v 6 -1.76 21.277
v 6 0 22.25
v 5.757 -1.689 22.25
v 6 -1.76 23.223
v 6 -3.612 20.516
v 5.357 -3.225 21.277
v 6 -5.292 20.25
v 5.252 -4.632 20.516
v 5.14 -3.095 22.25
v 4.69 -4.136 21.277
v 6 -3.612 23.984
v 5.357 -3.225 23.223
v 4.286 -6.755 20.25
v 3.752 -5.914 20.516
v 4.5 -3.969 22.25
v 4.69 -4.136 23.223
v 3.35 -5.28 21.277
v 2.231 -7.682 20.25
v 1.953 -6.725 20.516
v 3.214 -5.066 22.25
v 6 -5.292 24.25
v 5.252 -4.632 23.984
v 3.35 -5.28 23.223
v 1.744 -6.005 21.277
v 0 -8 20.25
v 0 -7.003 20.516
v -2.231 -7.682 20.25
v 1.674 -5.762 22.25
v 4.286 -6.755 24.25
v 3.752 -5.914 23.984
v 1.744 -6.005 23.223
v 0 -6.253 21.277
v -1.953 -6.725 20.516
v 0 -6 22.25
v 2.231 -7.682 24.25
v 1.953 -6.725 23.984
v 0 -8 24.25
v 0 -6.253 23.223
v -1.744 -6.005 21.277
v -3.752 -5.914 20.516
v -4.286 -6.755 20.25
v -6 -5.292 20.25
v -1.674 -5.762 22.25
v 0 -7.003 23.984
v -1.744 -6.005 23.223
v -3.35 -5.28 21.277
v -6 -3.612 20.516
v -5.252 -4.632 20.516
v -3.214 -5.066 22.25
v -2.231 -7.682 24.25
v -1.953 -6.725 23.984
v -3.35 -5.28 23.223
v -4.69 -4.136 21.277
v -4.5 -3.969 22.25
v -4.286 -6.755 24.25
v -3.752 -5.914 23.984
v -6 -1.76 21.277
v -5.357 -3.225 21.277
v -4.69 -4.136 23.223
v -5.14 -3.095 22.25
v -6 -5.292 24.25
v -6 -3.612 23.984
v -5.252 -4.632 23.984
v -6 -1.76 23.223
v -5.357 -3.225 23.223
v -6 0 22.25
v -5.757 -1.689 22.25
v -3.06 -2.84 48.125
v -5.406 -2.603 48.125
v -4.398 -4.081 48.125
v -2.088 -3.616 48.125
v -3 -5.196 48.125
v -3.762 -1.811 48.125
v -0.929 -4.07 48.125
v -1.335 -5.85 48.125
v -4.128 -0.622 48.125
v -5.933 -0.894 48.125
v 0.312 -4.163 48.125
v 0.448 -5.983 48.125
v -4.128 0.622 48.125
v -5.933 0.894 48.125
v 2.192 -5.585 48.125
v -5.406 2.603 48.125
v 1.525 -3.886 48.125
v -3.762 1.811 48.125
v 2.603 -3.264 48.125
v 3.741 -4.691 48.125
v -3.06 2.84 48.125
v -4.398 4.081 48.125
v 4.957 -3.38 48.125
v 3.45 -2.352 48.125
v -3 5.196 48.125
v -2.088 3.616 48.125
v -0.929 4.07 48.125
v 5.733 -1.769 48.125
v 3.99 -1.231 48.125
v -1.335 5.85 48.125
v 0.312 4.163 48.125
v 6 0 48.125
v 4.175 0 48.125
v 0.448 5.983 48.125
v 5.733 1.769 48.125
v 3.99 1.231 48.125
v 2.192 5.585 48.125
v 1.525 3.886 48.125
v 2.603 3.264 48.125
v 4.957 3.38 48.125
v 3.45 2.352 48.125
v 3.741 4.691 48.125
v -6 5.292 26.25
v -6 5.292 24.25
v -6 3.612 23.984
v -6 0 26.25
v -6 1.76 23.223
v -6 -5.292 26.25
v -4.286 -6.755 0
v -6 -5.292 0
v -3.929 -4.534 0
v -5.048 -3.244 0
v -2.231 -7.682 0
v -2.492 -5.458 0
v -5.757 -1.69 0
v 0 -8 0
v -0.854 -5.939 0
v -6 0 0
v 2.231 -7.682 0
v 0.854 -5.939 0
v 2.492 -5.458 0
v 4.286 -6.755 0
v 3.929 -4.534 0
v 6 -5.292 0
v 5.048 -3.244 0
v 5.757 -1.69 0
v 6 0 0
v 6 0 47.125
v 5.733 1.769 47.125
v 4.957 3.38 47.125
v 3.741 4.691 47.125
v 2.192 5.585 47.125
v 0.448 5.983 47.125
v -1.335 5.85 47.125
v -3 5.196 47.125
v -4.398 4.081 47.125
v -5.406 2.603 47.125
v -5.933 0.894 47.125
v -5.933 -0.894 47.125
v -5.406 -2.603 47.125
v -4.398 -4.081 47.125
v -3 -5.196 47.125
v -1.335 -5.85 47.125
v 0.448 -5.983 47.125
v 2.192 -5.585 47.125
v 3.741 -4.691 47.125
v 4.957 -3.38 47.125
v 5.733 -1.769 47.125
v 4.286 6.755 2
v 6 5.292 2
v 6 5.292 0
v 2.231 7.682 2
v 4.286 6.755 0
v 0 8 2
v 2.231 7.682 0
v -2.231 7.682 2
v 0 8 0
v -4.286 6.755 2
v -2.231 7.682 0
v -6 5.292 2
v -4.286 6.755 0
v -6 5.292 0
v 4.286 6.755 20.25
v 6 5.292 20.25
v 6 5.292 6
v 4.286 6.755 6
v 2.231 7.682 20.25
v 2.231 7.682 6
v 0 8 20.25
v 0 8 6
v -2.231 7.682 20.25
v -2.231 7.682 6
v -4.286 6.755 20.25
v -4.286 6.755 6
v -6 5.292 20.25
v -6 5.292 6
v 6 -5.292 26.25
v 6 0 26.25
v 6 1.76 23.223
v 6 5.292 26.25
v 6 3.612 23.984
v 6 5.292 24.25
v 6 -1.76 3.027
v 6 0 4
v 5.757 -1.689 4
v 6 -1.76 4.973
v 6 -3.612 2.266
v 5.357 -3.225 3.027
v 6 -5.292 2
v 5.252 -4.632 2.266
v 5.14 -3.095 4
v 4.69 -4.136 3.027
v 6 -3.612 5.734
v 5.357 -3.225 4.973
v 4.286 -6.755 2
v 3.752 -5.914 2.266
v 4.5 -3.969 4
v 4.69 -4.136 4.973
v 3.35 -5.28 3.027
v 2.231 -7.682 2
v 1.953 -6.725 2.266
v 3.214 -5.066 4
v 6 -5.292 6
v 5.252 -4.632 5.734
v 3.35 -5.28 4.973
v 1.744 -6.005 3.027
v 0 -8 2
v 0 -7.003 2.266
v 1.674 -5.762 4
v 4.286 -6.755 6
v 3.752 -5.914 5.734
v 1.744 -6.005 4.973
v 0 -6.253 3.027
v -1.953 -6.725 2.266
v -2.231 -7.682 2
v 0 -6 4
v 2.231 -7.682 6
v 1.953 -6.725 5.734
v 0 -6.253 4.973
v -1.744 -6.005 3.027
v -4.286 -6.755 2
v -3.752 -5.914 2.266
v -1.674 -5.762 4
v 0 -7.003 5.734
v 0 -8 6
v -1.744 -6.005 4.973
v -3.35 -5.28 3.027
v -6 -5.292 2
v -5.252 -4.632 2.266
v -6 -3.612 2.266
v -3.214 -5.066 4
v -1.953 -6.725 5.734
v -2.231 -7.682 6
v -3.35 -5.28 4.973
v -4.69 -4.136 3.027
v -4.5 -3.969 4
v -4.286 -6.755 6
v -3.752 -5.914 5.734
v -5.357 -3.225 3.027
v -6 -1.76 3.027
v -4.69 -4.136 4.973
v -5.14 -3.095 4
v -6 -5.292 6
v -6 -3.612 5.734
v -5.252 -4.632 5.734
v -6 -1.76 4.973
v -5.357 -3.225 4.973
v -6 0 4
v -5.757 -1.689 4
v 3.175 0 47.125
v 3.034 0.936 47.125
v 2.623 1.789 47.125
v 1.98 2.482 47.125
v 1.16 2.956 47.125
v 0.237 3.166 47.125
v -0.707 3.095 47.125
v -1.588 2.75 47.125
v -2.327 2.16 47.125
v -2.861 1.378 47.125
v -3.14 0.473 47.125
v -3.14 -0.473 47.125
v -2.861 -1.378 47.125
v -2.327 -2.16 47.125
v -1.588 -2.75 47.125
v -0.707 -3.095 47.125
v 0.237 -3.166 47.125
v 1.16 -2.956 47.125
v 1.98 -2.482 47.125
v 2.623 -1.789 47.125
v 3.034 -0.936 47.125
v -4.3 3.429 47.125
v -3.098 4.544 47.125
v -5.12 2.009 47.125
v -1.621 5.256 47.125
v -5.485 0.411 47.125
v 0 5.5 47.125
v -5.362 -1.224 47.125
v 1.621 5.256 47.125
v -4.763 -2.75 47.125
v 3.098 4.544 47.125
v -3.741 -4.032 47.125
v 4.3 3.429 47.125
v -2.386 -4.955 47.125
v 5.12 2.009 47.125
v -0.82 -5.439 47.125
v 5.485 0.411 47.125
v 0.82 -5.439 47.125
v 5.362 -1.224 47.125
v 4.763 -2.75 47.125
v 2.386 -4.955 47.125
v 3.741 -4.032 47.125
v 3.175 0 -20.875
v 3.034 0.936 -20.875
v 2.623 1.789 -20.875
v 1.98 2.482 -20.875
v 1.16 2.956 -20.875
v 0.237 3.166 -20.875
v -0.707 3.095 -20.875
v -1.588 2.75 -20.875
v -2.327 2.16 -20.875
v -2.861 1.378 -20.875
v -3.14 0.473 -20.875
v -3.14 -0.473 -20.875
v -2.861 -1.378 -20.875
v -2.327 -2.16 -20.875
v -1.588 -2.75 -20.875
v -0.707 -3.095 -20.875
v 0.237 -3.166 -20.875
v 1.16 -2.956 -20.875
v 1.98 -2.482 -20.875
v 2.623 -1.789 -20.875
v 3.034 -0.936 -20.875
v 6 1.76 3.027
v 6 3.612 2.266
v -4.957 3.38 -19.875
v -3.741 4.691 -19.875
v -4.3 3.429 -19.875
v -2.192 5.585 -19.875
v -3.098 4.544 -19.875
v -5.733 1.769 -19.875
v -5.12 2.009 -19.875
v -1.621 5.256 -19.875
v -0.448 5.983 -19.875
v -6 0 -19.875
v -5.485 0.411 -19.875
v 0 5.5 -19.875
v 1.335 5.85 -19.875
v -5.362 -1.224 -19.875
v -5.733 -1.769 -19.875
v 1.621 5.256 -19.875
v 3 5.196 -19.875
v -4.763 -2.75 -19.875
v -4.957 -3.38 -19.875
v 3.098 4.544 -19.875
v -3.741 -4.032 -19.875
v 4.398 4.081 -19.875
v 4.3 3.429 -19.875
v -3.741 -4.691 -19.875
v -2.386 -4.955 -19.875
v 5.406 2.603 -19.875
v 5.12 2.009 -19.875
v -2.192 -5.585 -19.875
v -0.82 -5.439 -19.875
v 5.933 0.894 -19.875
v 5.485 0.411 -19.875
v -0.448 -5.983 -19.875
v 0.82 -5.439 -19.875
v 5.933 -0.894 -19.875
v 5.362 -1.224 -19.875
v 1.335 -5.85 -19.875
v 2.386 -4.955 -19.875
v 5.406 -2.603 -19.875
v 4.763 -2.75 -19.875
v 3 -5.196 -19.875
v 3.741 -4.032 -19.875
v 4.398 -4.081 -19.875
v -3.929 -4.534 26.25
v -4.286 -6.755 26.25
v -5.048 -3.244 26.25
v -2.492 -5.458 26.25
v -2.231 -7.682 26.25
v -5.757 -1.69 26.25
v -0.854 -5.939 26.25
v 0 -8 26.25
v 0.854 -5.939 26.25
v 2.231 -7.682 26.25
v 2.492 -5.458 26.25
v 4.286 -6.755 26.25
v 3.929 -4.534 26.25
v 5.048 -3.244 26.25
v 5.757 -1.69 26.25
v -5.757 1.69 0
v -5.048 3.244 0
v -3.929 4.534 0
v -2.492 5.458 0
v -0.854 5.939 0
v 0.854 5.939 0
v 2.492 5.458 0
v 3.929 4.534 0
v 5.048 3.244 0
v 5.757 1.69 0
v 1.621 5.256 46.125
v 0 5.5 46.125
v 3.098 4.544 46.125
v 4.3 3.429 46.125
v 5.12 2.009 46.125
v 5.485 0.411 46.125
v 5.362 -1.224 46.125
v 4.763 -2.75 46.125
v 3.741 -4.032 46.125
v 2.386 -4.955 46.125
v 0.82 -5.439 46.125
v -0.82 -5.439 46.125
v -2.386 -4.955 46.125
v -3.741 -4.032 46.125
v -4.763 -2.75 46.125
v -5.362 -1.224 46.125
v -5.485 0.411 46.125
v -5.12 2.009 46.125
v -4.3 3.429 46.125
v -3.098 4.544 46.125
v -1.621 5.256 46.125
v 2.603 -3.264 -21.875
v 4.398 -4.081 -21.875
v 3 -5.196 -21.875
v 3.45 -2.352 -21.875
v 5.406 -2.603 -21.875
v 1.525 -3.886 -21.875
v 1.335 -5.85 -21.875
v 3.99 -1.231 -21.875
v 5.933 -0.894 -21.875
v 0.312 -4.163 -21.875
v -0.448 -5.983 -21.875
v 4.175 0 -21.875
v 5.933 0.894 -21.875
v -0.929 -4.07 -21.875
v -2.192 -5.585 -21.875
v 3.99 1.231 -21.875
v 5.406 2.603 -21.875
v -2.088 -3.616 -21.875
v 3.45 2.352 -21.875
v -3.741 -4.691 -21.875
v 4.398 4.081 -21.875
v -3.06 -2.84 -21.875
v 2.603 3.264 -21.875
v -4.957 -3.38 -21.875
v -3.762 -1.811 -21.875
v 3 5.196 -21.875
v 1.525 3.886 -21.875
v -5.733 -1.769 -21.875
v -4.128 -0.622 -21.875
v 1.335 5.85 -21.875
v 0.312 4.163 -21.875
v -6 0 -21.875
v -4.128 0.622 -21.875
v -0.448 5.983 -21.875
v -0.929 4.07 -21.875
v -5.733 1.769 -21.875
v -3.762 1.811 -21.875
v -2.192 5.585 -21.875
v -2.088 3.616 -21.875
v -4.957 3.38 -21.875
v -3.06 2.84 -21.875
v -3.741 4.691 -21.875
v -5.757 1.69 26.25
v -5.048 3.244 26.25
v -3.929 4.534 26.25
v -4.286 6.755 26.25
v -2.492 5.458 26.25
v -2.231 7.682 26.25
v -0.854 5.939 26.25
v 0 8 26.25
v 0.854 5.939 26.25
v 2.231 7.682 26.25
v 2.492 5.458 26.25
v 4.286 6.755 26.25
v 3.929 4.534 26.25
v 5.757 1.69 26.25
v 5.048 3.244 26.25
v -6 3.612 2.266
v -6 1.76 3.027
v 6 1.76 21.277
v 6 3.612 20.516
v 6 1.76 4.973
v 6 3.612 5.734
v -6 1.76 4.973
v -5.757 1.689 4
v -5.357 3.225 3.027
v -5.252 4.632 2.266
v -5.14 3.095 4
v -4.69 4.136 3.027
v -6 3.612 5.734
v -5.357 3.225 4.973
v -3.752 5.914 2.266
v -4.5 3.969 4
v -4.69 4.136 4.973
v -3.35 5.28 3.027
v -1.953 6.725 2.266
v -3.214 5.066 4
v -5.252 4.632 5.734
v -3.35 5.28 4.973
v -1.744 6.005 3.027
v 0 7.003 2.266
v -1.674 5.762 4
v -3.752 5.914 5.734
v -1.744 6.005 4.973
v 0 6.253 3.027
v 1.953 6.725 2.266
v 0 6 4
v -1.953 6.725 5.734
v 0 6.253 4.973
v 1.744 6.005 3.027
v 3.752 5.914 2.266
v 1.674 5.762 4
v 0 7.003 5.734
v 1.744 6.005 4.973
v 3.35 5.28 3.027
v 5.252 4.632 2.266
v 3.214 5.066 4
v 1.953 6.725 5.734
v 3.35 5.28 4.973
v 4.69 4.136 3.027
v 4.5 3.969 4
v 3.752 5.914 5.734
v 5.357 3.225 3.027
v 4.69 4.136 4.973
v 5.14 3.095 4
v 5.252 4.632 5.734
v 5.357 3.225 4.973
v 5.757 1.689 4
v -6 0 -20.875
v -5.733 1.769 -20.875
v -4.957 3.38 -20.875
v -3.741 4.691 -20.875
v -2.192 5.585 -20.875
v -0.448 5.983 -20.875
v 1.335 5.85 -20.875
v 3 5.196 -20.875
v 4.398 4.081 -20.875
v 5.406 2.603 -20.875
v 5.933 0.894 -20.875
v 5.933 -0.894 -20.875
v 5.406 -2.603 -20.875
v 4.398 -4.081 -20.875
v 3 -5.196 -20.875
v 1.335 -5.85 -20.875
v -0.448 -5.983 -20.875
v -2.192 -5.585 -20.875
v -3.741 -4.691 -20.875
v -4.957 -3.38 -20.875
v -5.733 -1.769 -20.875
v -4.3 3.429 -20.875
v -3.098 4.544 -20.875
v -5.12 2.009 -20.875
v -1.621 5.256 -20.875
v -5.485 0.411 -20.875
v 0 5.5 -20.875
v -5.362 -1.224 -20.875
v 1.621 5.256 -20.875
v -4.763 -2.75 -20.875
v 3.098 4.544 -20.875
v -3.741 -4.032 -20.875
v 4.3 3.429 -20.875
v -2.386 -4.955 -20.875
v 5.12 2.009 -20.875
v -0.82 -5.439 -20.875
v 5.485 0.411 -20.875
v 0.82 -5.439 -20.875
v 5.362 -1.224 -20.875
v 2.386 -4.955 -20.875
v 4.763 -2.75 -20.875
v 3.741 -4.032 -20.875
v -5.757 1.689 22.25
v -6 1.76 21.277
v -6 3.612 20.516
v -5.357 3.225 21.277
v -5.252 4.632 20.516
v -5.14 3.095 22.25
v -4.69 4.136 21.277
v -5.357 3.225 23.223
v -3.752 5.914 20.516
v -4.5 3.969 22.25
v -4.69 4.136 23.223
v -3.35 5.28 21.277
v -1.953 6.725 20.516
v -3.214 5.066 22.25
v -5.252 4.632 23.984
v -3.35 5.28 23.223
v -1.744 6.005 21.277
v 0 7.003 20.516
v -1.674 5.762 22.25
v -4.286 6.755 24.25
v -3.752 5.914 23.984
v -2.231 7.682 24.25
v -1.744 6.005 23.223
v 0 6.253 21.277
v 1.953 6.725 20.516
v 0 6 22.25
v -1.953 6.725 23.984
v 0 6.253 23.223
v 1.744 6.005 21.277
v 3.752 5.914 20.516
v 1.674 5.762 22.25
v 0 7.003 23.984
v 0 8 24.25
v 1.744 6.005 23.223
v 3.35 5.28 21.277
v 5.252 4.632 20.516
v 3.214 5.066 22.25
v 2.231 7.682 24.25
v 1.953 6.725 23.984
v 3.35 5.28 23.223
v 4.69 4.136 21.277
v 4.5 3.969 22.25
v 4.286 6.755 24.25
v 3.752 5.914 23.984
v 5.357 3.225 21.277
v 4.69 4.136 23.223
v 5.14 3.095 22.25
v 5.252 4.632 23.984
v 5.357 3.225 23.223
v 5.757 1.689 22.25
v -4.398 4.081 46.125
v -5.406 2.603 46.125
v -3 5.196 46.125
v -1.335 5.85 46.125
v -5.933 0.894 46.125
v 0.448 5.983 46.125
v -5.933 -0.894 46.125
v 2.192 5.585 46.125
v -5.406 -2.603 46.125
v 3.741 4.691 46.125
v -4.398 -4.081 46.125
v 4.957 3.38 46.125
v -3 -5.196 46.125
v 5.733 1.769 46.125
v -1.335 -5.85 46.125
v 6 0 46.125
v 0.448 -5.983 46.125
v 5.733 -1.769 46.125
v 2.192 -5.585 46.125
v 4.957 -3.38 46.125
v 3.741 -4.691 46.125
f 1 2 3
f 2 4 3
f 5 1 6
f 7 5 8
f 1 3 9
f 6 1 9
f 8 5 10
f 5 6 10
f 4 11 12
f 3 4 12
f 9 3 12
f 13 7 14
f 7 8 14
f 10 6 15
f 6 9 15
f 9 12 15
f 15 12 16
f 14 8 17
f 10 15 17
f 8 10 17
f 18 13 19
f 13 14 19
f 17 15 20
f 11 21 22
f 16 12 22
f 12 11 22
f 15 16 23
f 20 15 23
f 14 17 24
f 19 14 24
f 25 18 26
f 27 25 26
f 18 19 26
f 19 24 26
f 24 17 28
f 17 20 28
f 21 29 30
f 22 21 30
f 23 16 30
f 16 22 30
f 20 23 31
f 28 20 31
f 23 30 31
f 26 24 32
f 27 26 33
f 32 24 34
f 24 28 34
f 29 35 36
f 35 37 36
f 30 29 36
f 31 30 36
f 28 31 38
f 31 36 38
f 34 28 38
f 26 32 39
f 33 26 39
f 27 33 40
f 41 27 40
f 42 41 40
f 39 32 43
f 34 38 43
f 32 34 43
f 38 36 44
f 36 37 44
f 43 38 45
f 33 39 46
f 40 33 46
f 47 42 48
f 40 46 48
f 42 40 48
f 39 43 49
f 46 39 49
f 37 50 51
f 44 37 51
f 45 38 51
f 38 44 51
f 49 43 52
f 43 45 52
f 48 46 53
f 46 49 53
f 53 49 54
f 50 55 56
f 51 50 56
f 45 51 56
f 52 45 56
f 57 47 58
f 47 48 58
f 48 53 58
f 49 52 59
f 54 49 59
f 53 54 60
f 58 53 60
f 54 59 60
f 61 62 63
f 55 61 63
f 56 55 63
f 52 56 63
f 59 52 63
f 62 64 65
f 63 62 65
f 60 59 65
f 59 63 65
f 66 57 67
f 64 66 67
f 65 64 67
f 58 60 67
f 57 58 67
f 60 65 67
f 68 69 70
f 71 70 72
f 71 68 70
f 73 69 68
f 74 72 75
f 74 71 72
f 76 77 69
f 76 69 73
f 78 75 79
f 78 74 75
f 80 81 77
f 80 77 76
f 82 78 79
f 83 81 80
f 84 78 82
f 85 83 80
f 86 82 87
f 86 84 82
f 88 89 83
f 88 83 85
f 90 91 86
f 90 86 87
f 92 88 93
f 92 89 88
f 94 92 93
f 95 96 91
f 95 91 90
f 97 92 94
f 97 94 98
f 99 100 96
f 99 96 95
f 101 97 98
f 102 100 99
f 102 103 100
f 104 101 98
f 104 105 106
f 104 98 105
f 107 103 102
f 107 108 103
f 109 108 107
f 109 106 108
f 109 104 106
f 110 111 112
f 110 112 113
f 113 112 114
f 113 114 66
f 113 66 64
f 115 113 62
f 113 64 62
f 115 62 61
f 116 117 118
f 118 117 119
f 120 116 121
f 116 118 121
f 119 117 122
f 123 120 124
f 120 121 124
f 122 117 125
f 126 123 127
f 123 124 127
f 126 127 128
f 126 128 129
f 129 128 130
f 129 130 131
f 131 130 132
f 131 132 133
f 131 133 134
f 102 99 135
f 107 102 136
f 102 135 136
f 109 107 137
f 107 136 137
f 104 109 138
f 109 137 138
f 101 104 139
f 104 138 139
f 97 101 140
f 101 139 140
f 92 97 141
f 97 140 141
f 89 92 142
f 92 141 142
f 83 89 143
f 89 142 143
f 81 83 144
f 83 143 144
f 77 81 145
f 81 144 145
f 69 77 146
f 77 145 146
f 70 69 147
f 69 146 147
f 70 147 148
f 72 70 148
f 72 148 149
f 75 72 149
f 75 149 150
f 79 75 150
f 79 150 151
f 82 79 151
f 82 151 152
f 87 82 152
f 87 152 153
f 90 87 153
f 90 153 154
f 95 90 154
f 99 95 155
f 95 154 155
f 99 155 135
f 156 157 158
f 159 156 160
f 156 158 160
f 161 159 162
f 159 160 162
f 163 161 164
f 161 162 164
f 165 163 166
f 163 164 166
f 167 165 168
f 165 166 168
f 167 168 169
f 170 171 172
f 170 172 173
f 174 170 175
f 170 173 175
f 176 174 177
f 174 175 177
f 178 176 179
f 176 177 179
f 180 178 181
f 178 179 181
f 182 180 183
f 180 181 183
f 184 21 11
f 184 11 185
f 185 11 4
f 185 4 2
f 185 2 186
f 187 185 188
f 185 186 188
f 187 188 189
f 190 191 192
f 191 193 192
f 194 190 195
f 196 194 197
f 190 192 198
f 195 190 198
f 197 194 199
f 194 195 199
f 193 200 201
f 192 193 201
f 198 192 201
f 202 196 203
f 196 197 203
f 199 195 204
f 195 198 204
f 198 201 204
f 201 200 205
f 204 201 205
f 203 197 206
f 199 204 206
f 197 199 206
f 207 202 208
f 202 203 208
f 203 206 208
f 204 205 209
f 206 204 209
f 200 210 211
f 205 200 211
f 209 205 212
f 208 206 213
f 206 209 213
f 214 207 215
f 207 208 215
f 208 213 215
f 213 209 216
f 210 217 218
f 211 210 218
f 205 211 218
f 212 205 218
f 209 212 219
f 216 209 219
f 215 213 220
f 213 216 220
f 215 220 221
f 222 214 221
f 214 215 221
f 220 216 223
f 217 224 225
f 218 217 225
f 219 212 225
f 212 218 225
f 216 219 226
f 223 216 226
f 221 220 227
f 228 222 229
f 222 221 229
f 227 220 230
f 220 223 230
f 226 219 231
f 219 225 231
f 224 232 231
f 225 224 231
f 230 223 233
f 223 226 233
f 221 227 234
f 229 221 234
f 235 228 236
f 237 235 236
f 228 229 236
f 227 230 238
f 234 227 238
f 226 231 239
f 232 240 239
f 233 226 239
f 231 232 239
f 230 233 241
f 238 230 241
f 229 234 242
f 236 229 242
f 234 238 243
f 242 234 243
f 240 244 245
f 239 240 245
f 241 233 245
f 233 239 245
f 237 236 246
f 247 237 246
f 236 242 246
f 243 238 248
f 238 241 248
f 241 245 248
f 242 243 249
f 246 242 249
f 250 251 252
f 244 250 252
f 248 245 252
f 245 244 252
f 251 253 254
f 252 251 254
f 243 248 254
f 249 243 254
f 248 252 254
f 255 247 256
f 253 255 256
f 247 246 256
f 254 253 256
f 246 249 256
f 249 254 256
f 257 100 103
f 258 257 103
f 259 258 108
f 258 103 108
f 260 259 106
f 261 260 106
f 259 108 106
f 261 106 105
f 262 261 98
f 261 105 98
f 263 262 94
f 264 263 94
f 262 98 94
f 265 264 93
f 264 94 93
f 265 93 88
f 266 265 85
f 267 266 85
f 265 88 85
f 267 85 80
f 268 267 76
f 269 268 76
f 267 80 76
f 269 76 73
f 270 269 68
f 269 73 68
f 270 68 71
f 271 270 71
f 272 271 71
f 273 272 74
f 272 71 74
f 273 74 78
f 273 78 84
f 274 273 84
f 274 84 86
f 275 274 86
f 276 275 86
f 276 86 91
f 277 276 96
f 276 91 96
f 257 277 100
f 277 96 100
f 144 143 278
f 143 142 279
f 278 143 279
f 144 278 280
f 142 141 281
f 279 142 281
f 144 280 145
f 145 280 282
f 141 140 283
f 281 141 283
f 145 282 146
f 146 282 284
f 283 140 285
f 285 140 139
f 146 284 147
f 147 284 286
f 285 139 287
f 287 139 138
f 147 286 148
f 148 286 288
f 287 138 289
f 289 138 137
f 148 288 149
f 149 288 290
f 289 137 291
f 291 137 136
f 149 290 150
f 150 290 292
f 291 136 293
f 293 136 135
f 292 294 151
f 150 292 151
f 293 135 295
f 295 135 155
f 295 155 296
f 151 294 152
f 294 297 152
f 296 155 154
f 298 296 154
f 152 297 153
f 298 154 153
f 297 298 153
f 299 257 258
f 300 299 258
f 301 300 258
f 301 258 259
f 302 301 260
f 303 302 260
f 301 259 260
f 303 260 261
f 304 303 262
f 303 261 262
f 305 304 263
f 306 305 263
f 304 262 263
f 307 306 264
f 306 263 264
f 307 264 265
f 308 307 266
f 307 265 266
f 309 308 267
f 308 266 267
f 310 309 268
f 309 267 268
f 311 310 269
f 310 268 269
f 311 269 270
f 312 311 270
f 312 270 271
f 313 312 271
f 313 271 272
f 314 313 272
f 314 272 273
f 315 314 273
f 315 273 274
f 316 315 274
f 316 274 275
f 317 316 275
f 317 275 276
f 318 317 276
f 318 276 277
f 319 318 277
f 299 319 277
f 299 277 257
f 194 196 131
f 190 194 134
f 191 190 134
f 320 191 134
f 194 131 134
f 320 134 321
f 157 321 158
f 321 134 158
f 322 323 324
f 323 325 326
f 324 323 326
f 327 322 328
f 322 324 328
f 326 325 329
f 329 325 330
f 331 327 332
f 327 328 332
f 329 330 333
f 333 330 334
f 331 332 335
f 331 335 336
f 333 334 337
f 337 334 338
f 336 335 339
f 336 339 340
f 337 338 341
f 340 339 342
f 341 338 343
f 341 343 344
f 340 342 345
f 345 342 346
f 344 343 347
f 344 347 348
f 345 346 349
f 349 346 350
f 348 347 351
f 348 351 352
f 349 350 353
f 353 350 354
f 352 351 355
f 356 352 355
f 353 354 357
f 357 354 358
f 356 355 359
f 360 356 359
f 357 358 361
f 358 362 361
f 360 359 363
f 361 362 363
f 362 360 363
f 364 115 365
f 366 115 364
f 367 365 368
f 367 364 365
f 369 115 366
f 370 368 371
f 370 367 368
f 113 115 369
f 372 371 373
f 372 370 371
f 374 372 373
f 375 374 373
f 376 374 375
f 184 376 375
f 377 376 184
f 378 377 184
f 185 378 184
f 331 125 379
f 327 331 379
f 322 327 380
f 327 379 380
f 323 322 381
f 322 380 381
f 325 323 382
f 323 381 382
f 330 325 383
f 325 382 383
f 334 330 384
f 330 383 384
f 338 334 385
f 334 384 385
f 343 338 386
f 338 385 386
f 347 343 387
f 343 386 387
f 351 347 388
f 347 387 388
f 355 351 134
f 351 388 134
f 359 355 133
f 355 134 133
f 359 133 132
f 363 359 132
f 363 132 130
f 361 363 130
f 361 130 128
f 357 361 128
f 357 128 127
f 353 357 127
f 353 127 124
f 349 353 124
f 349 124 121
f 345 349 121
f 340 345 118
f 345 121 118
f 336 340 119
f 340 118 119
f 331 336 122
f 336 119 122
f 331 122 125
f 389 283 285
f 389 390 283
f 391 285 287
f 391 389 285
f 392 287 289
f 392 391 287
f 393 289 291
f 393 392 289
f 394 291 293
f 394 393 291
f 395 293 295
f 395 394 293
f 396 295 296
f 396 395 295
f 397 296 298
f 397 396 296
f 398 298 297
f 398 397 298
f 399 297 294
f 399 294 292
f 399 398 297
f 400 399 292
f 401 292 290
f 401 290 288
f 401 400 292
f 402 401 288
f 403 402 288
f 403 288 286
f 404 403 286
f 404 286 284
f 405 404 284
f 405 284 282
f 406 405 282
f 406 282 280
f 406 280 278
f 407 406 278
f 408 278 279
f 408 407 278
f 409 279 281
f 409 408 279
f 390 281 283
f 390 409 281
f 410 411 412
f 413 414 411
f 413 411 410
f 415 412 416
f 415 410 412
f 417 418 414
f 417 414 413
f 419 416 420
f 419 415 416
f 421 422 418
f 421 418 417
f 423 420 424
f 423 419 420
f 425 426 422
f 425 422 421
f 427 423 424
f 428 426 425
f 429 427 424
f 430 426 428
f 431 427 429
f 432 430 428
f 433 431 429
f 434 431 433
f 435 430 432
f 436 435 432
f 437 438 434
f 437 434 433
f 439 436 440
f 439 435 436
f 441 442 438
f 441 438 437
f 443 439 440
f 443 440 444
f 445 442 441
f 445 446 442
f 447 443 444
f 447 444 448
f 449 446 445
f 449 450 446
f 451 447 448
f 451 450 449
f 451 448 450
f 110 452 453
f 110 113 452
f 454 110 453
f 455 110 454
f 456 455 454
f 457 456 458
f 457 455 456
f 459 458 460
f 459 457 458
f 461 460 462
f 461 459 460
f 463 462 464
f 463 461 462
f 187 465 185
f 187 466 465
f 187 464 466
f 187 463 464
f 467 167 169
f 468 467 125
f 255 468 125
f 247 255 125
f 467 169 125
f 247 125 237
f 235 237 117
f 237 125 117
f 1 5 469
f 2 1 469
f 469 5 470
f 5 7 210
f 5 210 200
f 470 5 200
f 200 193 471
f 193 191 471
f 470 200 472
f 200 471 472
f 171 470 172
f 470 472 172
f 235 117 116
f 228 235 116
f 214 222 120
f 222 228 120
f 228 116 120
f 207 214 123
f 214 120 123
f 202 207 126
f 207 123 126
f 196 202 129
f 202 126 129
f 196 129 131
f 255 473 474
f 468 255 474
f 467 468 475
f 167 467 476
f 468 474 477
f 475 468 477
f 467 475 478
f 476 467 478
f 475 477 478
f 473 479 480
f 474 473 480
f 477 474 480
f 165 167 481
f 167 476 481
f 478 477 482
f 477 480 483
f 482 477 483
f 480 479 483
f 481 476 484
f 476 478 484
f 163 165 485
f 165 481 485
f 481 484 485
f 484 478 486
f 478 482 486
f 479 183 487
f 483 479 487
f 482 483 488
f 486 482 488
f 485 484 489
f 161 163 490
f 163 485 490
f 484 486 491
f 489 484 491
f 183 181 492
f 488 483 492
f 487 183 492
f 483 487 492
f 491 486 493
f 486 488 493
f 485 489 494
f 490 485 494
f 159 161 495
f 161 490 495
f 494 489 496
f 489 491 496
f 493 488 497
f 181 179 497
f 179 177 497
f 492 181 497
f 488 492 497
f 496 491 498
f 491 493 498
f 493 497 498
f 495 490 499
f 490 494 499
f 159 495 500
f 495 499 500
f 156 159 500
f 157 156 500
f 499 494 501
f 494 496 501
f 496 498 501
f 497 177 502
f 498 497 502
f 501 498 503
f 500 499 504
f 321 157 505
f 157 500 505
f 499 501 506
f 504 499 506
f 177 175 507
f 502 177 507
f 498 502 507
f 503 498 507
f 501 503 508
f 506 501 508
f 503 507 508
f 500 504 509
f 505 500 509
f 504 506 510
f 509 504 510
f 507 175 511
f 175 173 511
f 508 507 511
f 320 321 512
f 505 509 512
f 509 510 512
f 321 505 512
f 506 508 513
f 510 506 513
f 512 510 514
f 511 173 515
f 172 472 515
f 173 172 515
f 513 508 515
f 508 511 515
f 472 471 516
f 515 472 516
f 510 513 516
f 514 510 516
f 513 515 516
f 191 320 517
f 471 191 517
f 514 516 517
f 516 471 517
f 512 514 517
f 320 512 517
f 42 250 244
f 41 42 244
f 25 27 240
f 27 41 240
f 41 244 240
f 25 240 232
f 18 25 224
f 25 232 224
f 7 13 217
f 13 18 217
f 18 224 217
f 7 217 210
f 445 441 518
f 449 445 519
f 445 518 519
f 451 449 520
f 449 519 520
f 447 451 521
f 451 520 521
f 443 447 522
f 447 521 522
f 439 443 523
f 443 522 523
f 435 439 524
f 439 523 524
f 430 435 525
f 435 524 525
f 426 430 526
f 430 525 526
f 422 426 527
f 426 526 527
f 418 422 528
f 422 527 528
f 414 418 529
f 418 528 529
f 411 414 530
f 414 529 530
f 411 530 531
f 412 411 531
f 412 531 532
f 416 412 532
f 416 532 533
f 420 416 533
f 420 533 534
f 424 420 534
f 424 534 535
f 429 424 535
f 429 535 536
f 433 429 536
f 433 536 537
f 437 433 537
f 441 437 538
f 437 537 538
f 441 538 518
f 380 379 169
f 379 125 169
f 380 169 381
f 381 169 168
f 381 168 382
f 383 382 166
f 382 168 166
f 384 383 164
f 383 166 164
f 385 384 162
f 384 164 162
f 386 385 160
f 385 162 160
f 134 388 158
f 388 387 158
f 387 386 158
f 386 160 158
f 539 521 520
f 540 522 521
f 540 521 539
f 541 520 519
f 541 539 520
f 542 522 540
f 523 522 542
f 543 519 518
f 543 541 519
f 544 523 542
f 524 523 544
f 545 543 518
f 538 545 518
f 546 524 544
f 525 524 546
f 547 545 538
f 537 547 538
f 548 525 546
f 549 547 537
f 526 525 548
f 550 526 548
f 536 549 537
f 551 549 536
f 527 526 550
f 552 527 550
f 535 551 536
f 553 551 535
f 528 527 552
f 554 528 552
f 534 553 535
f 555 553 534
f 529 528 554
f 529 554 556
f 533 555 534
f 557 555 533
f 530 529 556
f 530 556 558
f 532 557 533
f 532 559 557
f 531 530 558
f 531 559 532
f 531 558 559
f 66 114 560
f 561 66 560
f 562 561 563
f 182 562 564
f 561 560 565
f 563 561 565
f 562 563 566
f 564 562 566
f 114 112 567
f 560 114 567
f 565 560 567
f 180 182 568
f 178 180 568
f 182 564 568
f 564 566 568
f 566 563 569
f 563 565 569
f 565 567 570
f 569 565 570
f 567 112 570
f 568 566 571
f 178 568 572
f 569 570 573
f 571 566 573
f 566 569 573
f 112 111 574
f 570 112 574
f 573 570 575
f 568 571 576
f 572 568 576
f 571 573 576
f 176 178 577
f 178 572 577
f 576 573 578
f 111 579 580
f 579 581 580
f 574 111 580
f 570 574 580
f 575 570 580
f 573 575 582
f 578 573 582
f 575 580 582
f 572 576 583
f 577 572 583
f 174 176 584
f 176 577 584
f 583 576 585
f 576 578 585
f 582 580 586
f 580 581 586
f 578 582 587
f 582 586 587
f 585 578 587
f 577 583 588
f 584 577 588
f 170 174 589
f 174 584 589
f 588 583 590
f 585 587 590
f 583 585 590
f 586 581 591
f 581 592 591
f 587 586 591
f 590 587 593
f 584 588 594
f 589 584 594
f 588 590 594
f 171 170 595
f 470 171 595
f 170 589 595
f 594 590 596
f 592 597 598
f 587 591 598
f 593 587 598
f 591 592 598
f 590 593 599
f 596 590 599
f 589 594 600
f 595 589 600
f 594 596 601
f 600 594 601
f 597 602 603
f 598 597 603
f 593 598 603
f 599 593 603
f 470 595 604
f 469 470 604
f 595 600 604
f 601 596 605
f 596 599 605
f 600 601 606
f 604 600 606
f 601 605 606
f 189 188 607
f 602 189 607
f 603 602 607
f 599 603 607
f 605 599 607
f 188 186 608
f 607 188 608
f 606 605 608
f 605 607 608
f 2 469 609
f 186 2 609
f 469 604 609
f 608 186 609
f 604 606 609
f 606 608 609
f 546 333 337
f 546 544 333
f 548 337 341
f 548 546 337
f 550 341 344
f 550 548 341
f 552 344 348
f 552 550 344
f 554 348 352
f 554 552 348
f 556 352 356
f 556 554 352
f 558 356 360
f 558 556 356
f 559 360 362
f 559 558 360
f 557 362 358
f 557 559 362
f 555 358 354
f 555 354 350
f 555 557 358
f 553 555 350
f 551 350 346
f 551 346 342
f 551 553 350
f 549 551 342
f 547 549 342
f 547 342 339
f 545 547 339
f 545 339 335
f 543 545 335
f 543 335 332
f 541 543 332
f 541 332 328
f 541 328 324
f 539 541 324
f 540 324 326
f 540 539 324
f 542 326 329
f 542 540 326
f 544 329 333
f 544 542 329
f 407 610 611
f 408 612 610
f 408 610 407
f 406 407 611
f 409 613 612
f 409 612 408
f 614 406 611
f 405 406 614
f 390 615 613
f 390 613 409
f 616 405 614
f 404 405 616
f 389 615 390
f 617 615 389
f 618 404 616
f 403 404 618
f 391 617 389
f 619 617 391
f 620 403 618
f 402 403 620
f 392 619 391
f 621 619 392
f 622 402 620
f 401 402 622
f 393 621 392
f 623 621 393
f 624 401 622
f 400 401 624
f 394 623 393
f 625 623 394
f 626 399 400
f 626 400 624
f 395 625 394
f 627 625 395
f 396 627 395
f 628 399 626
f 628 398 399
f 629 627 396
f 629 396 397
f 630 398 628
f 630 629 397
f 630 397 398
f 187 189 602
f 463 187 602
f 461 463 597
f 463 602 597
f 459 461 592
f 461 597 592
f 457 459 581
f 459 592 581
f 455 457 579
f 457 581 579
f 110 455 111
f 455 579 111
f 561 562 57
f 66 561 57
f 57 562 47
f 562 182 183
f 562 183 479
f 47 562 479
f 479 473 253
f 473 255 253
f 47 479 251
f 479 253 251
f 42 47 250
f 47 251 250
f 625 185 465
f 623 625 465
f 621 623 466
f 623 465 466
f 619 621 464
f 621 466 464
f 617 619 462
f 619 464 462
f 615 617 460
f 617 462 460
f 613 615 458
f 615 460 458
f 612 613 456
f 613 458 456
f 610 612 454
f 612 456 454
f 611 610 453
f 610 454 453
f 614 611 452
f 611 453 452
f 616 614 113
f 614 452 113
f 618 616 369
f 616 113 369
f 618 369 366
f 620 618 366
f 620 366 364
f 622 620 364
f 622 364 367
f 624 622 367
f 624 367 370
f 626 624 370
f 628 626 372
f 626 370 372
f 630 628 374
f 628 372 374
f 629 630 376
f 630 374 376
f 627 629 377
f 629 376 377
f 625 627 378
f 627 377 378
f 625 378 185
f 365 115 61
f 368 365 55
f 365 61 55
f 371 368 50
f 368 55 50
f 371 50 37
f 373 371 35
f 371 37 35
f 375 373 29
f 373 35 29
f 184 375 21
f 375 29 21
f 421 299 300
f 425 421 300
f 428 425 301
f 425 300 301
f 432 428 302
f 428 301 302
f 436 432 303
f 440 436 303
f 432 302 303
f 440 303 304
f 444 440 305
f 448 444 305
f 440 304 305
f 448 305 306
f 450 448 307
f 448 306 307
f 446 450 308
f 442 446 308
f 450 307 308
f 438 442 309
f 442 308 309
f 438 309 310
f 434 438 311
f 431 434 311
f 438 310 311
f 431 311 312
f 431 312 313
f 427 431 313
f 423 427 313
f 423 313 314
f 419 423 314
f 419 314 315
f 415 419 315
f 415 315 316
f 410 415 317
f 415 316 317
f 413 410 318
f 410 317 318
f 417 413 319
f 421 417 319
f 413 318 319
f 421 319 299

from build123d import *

# Parameters (mm, degrees)
SKETCH1_R               = 8
BOSS_EXTRUDE1_DEPTH     = 26.25
SKETCH2_R               = 6
BOSS_EXTRUDE2_DEPTH     = 21.875
SKETCH3_R               = 6
BOSS_EXTRUDE3_DEPTH     = 21.875
CUT_EXTRUDE4_DEPTH      = 22.875
CUT_EXTRUDE4_DEPTH_BACK = 49.125
SKETCH7_W               = 1
SKETCH7_H               = 0.5
SKETCH9_R               = 3.175
CUT_EXTRUDE5_DEPTH      = 71
CHAMFER1_SIZE           = 1


with BuildPart() as part:
    # Sketch1 → Boss-Extrude1 (new body)
    with BuildSketch(Plane.XY):
        Circle(SKETCH1_R)
    extrude(amount=BOSS_EXTRUDE1_DEPTH)

    # Sketch2 → Boss-Extrude2 (add)
    with BuildSketch(Plane(origin=(0, 0, 0), x_dir=(-1, 0, 0), z_dir=(0, 0, -1))):
        Circle(SKETCH2_R)
    extrude(amount=BOSS_EXTRUDE2_DEPTH)

    # Sketch3 → Boss-Extrude3 (add)
    with BuildSketch(Plane.XY.offset(26.25)):
        Circle(SKETCH3_R)
    extrude(amount=BOSS_EXTRUDE3_DEPTH)

    # Sketch5 → Cut-Extrude4 (cut, two sides)
    with BuildSketch(Plane(origin=(0, 0, 0), x_dir=(-1, 0, 0), z_dir=(0, 0, -1))) as cut_extrude4_sk:
        with BuildLine():
            Line((-6, -5.291502622), (-6, 5.291502622))
            ThreePointArc((-6, 5.291502622), (-8, 0), (-6, -5.291502622))
        make_face()
        with BuildLine():
            ThreePointArc((8, 0), (7.483314774, 2.828427125), (6, 5.291502622))
            Line((6, 5.291502622), (6, -5.291502622))
            ThreePointArc((6, -5.291502622), (7.483314774, -2.828427125), (8, 0))
        make_face()
    extrude(amount=CUT_EXTRUDE4_DEPTH, mode=Mode.SUBTRACT)
    extrude(cut_extrude4_sk.sketch, amount=-CUT_EXTRUDE4_DEPTH_BACK, mode=Mode.SUBTRACT)

    # Sketch7 → Cut-Revolve1 (revolve, cut)
    with BuildSketch(Plane(origin=(0, 0, 0), x_dir=(0, 0, -1), z_dir=(1, 0, 0))):
        with Locations((20.375, 5.75)):
            Rectangle(SKETCH7_W, SKETCH7_H)
        with Locations((-46.625, 5.75)):
            Rectangle(SKETCH7_W, SKETCH7_H)
    revolve(axis=Axis((0, 0, 48.125), (0, 0, -1)), mode=Mode.SUBTRACT)

    # Sketch8 → Cut-Revolve2 (revolve, cut)
    with BuildSketch(Plane(origin=(0, 0, 0), x_dir=(0, 0, -1), z_dir=(1, 0, 0))):
        with BuildLine():
            Line((-24.25, 8), (-20.25, 8))
            ThreePointArc((-20.25, 8), (-22.25, 6), (-24.25, 8))
        make_face()
        with BuildLine():
            Line((-6, 8), (-2, 8))
            ThreePointArc((-2, 8), (-4, 6), (-6, 8))
        make_face()
    revolve(axis=Axis((0, 0, 48.125), (0, 0, -1)), mode=Mode.SUBTRACT)

    # Sketch9 → Cut-Extrude5 (cut, through all)
    with BuildSketch(Plane.XY.offset(48.125)):
        Circle(SKETCH9_R)
    extrude(amount=-CUT_EXTRUDE5_DEPTH, mode=Mode.SUBTRACT)

    # Chamfer1
    chamfer1_edges = [part.edges().sort_by_distance(p)[0] for p in [
        (-3.175, 0, -21.875),
        (-3.175, 0, 48.125),
    ]]
    chamfer(chamfer1_edges, length=CHAMFER1_SIZE)


solid = part.part
